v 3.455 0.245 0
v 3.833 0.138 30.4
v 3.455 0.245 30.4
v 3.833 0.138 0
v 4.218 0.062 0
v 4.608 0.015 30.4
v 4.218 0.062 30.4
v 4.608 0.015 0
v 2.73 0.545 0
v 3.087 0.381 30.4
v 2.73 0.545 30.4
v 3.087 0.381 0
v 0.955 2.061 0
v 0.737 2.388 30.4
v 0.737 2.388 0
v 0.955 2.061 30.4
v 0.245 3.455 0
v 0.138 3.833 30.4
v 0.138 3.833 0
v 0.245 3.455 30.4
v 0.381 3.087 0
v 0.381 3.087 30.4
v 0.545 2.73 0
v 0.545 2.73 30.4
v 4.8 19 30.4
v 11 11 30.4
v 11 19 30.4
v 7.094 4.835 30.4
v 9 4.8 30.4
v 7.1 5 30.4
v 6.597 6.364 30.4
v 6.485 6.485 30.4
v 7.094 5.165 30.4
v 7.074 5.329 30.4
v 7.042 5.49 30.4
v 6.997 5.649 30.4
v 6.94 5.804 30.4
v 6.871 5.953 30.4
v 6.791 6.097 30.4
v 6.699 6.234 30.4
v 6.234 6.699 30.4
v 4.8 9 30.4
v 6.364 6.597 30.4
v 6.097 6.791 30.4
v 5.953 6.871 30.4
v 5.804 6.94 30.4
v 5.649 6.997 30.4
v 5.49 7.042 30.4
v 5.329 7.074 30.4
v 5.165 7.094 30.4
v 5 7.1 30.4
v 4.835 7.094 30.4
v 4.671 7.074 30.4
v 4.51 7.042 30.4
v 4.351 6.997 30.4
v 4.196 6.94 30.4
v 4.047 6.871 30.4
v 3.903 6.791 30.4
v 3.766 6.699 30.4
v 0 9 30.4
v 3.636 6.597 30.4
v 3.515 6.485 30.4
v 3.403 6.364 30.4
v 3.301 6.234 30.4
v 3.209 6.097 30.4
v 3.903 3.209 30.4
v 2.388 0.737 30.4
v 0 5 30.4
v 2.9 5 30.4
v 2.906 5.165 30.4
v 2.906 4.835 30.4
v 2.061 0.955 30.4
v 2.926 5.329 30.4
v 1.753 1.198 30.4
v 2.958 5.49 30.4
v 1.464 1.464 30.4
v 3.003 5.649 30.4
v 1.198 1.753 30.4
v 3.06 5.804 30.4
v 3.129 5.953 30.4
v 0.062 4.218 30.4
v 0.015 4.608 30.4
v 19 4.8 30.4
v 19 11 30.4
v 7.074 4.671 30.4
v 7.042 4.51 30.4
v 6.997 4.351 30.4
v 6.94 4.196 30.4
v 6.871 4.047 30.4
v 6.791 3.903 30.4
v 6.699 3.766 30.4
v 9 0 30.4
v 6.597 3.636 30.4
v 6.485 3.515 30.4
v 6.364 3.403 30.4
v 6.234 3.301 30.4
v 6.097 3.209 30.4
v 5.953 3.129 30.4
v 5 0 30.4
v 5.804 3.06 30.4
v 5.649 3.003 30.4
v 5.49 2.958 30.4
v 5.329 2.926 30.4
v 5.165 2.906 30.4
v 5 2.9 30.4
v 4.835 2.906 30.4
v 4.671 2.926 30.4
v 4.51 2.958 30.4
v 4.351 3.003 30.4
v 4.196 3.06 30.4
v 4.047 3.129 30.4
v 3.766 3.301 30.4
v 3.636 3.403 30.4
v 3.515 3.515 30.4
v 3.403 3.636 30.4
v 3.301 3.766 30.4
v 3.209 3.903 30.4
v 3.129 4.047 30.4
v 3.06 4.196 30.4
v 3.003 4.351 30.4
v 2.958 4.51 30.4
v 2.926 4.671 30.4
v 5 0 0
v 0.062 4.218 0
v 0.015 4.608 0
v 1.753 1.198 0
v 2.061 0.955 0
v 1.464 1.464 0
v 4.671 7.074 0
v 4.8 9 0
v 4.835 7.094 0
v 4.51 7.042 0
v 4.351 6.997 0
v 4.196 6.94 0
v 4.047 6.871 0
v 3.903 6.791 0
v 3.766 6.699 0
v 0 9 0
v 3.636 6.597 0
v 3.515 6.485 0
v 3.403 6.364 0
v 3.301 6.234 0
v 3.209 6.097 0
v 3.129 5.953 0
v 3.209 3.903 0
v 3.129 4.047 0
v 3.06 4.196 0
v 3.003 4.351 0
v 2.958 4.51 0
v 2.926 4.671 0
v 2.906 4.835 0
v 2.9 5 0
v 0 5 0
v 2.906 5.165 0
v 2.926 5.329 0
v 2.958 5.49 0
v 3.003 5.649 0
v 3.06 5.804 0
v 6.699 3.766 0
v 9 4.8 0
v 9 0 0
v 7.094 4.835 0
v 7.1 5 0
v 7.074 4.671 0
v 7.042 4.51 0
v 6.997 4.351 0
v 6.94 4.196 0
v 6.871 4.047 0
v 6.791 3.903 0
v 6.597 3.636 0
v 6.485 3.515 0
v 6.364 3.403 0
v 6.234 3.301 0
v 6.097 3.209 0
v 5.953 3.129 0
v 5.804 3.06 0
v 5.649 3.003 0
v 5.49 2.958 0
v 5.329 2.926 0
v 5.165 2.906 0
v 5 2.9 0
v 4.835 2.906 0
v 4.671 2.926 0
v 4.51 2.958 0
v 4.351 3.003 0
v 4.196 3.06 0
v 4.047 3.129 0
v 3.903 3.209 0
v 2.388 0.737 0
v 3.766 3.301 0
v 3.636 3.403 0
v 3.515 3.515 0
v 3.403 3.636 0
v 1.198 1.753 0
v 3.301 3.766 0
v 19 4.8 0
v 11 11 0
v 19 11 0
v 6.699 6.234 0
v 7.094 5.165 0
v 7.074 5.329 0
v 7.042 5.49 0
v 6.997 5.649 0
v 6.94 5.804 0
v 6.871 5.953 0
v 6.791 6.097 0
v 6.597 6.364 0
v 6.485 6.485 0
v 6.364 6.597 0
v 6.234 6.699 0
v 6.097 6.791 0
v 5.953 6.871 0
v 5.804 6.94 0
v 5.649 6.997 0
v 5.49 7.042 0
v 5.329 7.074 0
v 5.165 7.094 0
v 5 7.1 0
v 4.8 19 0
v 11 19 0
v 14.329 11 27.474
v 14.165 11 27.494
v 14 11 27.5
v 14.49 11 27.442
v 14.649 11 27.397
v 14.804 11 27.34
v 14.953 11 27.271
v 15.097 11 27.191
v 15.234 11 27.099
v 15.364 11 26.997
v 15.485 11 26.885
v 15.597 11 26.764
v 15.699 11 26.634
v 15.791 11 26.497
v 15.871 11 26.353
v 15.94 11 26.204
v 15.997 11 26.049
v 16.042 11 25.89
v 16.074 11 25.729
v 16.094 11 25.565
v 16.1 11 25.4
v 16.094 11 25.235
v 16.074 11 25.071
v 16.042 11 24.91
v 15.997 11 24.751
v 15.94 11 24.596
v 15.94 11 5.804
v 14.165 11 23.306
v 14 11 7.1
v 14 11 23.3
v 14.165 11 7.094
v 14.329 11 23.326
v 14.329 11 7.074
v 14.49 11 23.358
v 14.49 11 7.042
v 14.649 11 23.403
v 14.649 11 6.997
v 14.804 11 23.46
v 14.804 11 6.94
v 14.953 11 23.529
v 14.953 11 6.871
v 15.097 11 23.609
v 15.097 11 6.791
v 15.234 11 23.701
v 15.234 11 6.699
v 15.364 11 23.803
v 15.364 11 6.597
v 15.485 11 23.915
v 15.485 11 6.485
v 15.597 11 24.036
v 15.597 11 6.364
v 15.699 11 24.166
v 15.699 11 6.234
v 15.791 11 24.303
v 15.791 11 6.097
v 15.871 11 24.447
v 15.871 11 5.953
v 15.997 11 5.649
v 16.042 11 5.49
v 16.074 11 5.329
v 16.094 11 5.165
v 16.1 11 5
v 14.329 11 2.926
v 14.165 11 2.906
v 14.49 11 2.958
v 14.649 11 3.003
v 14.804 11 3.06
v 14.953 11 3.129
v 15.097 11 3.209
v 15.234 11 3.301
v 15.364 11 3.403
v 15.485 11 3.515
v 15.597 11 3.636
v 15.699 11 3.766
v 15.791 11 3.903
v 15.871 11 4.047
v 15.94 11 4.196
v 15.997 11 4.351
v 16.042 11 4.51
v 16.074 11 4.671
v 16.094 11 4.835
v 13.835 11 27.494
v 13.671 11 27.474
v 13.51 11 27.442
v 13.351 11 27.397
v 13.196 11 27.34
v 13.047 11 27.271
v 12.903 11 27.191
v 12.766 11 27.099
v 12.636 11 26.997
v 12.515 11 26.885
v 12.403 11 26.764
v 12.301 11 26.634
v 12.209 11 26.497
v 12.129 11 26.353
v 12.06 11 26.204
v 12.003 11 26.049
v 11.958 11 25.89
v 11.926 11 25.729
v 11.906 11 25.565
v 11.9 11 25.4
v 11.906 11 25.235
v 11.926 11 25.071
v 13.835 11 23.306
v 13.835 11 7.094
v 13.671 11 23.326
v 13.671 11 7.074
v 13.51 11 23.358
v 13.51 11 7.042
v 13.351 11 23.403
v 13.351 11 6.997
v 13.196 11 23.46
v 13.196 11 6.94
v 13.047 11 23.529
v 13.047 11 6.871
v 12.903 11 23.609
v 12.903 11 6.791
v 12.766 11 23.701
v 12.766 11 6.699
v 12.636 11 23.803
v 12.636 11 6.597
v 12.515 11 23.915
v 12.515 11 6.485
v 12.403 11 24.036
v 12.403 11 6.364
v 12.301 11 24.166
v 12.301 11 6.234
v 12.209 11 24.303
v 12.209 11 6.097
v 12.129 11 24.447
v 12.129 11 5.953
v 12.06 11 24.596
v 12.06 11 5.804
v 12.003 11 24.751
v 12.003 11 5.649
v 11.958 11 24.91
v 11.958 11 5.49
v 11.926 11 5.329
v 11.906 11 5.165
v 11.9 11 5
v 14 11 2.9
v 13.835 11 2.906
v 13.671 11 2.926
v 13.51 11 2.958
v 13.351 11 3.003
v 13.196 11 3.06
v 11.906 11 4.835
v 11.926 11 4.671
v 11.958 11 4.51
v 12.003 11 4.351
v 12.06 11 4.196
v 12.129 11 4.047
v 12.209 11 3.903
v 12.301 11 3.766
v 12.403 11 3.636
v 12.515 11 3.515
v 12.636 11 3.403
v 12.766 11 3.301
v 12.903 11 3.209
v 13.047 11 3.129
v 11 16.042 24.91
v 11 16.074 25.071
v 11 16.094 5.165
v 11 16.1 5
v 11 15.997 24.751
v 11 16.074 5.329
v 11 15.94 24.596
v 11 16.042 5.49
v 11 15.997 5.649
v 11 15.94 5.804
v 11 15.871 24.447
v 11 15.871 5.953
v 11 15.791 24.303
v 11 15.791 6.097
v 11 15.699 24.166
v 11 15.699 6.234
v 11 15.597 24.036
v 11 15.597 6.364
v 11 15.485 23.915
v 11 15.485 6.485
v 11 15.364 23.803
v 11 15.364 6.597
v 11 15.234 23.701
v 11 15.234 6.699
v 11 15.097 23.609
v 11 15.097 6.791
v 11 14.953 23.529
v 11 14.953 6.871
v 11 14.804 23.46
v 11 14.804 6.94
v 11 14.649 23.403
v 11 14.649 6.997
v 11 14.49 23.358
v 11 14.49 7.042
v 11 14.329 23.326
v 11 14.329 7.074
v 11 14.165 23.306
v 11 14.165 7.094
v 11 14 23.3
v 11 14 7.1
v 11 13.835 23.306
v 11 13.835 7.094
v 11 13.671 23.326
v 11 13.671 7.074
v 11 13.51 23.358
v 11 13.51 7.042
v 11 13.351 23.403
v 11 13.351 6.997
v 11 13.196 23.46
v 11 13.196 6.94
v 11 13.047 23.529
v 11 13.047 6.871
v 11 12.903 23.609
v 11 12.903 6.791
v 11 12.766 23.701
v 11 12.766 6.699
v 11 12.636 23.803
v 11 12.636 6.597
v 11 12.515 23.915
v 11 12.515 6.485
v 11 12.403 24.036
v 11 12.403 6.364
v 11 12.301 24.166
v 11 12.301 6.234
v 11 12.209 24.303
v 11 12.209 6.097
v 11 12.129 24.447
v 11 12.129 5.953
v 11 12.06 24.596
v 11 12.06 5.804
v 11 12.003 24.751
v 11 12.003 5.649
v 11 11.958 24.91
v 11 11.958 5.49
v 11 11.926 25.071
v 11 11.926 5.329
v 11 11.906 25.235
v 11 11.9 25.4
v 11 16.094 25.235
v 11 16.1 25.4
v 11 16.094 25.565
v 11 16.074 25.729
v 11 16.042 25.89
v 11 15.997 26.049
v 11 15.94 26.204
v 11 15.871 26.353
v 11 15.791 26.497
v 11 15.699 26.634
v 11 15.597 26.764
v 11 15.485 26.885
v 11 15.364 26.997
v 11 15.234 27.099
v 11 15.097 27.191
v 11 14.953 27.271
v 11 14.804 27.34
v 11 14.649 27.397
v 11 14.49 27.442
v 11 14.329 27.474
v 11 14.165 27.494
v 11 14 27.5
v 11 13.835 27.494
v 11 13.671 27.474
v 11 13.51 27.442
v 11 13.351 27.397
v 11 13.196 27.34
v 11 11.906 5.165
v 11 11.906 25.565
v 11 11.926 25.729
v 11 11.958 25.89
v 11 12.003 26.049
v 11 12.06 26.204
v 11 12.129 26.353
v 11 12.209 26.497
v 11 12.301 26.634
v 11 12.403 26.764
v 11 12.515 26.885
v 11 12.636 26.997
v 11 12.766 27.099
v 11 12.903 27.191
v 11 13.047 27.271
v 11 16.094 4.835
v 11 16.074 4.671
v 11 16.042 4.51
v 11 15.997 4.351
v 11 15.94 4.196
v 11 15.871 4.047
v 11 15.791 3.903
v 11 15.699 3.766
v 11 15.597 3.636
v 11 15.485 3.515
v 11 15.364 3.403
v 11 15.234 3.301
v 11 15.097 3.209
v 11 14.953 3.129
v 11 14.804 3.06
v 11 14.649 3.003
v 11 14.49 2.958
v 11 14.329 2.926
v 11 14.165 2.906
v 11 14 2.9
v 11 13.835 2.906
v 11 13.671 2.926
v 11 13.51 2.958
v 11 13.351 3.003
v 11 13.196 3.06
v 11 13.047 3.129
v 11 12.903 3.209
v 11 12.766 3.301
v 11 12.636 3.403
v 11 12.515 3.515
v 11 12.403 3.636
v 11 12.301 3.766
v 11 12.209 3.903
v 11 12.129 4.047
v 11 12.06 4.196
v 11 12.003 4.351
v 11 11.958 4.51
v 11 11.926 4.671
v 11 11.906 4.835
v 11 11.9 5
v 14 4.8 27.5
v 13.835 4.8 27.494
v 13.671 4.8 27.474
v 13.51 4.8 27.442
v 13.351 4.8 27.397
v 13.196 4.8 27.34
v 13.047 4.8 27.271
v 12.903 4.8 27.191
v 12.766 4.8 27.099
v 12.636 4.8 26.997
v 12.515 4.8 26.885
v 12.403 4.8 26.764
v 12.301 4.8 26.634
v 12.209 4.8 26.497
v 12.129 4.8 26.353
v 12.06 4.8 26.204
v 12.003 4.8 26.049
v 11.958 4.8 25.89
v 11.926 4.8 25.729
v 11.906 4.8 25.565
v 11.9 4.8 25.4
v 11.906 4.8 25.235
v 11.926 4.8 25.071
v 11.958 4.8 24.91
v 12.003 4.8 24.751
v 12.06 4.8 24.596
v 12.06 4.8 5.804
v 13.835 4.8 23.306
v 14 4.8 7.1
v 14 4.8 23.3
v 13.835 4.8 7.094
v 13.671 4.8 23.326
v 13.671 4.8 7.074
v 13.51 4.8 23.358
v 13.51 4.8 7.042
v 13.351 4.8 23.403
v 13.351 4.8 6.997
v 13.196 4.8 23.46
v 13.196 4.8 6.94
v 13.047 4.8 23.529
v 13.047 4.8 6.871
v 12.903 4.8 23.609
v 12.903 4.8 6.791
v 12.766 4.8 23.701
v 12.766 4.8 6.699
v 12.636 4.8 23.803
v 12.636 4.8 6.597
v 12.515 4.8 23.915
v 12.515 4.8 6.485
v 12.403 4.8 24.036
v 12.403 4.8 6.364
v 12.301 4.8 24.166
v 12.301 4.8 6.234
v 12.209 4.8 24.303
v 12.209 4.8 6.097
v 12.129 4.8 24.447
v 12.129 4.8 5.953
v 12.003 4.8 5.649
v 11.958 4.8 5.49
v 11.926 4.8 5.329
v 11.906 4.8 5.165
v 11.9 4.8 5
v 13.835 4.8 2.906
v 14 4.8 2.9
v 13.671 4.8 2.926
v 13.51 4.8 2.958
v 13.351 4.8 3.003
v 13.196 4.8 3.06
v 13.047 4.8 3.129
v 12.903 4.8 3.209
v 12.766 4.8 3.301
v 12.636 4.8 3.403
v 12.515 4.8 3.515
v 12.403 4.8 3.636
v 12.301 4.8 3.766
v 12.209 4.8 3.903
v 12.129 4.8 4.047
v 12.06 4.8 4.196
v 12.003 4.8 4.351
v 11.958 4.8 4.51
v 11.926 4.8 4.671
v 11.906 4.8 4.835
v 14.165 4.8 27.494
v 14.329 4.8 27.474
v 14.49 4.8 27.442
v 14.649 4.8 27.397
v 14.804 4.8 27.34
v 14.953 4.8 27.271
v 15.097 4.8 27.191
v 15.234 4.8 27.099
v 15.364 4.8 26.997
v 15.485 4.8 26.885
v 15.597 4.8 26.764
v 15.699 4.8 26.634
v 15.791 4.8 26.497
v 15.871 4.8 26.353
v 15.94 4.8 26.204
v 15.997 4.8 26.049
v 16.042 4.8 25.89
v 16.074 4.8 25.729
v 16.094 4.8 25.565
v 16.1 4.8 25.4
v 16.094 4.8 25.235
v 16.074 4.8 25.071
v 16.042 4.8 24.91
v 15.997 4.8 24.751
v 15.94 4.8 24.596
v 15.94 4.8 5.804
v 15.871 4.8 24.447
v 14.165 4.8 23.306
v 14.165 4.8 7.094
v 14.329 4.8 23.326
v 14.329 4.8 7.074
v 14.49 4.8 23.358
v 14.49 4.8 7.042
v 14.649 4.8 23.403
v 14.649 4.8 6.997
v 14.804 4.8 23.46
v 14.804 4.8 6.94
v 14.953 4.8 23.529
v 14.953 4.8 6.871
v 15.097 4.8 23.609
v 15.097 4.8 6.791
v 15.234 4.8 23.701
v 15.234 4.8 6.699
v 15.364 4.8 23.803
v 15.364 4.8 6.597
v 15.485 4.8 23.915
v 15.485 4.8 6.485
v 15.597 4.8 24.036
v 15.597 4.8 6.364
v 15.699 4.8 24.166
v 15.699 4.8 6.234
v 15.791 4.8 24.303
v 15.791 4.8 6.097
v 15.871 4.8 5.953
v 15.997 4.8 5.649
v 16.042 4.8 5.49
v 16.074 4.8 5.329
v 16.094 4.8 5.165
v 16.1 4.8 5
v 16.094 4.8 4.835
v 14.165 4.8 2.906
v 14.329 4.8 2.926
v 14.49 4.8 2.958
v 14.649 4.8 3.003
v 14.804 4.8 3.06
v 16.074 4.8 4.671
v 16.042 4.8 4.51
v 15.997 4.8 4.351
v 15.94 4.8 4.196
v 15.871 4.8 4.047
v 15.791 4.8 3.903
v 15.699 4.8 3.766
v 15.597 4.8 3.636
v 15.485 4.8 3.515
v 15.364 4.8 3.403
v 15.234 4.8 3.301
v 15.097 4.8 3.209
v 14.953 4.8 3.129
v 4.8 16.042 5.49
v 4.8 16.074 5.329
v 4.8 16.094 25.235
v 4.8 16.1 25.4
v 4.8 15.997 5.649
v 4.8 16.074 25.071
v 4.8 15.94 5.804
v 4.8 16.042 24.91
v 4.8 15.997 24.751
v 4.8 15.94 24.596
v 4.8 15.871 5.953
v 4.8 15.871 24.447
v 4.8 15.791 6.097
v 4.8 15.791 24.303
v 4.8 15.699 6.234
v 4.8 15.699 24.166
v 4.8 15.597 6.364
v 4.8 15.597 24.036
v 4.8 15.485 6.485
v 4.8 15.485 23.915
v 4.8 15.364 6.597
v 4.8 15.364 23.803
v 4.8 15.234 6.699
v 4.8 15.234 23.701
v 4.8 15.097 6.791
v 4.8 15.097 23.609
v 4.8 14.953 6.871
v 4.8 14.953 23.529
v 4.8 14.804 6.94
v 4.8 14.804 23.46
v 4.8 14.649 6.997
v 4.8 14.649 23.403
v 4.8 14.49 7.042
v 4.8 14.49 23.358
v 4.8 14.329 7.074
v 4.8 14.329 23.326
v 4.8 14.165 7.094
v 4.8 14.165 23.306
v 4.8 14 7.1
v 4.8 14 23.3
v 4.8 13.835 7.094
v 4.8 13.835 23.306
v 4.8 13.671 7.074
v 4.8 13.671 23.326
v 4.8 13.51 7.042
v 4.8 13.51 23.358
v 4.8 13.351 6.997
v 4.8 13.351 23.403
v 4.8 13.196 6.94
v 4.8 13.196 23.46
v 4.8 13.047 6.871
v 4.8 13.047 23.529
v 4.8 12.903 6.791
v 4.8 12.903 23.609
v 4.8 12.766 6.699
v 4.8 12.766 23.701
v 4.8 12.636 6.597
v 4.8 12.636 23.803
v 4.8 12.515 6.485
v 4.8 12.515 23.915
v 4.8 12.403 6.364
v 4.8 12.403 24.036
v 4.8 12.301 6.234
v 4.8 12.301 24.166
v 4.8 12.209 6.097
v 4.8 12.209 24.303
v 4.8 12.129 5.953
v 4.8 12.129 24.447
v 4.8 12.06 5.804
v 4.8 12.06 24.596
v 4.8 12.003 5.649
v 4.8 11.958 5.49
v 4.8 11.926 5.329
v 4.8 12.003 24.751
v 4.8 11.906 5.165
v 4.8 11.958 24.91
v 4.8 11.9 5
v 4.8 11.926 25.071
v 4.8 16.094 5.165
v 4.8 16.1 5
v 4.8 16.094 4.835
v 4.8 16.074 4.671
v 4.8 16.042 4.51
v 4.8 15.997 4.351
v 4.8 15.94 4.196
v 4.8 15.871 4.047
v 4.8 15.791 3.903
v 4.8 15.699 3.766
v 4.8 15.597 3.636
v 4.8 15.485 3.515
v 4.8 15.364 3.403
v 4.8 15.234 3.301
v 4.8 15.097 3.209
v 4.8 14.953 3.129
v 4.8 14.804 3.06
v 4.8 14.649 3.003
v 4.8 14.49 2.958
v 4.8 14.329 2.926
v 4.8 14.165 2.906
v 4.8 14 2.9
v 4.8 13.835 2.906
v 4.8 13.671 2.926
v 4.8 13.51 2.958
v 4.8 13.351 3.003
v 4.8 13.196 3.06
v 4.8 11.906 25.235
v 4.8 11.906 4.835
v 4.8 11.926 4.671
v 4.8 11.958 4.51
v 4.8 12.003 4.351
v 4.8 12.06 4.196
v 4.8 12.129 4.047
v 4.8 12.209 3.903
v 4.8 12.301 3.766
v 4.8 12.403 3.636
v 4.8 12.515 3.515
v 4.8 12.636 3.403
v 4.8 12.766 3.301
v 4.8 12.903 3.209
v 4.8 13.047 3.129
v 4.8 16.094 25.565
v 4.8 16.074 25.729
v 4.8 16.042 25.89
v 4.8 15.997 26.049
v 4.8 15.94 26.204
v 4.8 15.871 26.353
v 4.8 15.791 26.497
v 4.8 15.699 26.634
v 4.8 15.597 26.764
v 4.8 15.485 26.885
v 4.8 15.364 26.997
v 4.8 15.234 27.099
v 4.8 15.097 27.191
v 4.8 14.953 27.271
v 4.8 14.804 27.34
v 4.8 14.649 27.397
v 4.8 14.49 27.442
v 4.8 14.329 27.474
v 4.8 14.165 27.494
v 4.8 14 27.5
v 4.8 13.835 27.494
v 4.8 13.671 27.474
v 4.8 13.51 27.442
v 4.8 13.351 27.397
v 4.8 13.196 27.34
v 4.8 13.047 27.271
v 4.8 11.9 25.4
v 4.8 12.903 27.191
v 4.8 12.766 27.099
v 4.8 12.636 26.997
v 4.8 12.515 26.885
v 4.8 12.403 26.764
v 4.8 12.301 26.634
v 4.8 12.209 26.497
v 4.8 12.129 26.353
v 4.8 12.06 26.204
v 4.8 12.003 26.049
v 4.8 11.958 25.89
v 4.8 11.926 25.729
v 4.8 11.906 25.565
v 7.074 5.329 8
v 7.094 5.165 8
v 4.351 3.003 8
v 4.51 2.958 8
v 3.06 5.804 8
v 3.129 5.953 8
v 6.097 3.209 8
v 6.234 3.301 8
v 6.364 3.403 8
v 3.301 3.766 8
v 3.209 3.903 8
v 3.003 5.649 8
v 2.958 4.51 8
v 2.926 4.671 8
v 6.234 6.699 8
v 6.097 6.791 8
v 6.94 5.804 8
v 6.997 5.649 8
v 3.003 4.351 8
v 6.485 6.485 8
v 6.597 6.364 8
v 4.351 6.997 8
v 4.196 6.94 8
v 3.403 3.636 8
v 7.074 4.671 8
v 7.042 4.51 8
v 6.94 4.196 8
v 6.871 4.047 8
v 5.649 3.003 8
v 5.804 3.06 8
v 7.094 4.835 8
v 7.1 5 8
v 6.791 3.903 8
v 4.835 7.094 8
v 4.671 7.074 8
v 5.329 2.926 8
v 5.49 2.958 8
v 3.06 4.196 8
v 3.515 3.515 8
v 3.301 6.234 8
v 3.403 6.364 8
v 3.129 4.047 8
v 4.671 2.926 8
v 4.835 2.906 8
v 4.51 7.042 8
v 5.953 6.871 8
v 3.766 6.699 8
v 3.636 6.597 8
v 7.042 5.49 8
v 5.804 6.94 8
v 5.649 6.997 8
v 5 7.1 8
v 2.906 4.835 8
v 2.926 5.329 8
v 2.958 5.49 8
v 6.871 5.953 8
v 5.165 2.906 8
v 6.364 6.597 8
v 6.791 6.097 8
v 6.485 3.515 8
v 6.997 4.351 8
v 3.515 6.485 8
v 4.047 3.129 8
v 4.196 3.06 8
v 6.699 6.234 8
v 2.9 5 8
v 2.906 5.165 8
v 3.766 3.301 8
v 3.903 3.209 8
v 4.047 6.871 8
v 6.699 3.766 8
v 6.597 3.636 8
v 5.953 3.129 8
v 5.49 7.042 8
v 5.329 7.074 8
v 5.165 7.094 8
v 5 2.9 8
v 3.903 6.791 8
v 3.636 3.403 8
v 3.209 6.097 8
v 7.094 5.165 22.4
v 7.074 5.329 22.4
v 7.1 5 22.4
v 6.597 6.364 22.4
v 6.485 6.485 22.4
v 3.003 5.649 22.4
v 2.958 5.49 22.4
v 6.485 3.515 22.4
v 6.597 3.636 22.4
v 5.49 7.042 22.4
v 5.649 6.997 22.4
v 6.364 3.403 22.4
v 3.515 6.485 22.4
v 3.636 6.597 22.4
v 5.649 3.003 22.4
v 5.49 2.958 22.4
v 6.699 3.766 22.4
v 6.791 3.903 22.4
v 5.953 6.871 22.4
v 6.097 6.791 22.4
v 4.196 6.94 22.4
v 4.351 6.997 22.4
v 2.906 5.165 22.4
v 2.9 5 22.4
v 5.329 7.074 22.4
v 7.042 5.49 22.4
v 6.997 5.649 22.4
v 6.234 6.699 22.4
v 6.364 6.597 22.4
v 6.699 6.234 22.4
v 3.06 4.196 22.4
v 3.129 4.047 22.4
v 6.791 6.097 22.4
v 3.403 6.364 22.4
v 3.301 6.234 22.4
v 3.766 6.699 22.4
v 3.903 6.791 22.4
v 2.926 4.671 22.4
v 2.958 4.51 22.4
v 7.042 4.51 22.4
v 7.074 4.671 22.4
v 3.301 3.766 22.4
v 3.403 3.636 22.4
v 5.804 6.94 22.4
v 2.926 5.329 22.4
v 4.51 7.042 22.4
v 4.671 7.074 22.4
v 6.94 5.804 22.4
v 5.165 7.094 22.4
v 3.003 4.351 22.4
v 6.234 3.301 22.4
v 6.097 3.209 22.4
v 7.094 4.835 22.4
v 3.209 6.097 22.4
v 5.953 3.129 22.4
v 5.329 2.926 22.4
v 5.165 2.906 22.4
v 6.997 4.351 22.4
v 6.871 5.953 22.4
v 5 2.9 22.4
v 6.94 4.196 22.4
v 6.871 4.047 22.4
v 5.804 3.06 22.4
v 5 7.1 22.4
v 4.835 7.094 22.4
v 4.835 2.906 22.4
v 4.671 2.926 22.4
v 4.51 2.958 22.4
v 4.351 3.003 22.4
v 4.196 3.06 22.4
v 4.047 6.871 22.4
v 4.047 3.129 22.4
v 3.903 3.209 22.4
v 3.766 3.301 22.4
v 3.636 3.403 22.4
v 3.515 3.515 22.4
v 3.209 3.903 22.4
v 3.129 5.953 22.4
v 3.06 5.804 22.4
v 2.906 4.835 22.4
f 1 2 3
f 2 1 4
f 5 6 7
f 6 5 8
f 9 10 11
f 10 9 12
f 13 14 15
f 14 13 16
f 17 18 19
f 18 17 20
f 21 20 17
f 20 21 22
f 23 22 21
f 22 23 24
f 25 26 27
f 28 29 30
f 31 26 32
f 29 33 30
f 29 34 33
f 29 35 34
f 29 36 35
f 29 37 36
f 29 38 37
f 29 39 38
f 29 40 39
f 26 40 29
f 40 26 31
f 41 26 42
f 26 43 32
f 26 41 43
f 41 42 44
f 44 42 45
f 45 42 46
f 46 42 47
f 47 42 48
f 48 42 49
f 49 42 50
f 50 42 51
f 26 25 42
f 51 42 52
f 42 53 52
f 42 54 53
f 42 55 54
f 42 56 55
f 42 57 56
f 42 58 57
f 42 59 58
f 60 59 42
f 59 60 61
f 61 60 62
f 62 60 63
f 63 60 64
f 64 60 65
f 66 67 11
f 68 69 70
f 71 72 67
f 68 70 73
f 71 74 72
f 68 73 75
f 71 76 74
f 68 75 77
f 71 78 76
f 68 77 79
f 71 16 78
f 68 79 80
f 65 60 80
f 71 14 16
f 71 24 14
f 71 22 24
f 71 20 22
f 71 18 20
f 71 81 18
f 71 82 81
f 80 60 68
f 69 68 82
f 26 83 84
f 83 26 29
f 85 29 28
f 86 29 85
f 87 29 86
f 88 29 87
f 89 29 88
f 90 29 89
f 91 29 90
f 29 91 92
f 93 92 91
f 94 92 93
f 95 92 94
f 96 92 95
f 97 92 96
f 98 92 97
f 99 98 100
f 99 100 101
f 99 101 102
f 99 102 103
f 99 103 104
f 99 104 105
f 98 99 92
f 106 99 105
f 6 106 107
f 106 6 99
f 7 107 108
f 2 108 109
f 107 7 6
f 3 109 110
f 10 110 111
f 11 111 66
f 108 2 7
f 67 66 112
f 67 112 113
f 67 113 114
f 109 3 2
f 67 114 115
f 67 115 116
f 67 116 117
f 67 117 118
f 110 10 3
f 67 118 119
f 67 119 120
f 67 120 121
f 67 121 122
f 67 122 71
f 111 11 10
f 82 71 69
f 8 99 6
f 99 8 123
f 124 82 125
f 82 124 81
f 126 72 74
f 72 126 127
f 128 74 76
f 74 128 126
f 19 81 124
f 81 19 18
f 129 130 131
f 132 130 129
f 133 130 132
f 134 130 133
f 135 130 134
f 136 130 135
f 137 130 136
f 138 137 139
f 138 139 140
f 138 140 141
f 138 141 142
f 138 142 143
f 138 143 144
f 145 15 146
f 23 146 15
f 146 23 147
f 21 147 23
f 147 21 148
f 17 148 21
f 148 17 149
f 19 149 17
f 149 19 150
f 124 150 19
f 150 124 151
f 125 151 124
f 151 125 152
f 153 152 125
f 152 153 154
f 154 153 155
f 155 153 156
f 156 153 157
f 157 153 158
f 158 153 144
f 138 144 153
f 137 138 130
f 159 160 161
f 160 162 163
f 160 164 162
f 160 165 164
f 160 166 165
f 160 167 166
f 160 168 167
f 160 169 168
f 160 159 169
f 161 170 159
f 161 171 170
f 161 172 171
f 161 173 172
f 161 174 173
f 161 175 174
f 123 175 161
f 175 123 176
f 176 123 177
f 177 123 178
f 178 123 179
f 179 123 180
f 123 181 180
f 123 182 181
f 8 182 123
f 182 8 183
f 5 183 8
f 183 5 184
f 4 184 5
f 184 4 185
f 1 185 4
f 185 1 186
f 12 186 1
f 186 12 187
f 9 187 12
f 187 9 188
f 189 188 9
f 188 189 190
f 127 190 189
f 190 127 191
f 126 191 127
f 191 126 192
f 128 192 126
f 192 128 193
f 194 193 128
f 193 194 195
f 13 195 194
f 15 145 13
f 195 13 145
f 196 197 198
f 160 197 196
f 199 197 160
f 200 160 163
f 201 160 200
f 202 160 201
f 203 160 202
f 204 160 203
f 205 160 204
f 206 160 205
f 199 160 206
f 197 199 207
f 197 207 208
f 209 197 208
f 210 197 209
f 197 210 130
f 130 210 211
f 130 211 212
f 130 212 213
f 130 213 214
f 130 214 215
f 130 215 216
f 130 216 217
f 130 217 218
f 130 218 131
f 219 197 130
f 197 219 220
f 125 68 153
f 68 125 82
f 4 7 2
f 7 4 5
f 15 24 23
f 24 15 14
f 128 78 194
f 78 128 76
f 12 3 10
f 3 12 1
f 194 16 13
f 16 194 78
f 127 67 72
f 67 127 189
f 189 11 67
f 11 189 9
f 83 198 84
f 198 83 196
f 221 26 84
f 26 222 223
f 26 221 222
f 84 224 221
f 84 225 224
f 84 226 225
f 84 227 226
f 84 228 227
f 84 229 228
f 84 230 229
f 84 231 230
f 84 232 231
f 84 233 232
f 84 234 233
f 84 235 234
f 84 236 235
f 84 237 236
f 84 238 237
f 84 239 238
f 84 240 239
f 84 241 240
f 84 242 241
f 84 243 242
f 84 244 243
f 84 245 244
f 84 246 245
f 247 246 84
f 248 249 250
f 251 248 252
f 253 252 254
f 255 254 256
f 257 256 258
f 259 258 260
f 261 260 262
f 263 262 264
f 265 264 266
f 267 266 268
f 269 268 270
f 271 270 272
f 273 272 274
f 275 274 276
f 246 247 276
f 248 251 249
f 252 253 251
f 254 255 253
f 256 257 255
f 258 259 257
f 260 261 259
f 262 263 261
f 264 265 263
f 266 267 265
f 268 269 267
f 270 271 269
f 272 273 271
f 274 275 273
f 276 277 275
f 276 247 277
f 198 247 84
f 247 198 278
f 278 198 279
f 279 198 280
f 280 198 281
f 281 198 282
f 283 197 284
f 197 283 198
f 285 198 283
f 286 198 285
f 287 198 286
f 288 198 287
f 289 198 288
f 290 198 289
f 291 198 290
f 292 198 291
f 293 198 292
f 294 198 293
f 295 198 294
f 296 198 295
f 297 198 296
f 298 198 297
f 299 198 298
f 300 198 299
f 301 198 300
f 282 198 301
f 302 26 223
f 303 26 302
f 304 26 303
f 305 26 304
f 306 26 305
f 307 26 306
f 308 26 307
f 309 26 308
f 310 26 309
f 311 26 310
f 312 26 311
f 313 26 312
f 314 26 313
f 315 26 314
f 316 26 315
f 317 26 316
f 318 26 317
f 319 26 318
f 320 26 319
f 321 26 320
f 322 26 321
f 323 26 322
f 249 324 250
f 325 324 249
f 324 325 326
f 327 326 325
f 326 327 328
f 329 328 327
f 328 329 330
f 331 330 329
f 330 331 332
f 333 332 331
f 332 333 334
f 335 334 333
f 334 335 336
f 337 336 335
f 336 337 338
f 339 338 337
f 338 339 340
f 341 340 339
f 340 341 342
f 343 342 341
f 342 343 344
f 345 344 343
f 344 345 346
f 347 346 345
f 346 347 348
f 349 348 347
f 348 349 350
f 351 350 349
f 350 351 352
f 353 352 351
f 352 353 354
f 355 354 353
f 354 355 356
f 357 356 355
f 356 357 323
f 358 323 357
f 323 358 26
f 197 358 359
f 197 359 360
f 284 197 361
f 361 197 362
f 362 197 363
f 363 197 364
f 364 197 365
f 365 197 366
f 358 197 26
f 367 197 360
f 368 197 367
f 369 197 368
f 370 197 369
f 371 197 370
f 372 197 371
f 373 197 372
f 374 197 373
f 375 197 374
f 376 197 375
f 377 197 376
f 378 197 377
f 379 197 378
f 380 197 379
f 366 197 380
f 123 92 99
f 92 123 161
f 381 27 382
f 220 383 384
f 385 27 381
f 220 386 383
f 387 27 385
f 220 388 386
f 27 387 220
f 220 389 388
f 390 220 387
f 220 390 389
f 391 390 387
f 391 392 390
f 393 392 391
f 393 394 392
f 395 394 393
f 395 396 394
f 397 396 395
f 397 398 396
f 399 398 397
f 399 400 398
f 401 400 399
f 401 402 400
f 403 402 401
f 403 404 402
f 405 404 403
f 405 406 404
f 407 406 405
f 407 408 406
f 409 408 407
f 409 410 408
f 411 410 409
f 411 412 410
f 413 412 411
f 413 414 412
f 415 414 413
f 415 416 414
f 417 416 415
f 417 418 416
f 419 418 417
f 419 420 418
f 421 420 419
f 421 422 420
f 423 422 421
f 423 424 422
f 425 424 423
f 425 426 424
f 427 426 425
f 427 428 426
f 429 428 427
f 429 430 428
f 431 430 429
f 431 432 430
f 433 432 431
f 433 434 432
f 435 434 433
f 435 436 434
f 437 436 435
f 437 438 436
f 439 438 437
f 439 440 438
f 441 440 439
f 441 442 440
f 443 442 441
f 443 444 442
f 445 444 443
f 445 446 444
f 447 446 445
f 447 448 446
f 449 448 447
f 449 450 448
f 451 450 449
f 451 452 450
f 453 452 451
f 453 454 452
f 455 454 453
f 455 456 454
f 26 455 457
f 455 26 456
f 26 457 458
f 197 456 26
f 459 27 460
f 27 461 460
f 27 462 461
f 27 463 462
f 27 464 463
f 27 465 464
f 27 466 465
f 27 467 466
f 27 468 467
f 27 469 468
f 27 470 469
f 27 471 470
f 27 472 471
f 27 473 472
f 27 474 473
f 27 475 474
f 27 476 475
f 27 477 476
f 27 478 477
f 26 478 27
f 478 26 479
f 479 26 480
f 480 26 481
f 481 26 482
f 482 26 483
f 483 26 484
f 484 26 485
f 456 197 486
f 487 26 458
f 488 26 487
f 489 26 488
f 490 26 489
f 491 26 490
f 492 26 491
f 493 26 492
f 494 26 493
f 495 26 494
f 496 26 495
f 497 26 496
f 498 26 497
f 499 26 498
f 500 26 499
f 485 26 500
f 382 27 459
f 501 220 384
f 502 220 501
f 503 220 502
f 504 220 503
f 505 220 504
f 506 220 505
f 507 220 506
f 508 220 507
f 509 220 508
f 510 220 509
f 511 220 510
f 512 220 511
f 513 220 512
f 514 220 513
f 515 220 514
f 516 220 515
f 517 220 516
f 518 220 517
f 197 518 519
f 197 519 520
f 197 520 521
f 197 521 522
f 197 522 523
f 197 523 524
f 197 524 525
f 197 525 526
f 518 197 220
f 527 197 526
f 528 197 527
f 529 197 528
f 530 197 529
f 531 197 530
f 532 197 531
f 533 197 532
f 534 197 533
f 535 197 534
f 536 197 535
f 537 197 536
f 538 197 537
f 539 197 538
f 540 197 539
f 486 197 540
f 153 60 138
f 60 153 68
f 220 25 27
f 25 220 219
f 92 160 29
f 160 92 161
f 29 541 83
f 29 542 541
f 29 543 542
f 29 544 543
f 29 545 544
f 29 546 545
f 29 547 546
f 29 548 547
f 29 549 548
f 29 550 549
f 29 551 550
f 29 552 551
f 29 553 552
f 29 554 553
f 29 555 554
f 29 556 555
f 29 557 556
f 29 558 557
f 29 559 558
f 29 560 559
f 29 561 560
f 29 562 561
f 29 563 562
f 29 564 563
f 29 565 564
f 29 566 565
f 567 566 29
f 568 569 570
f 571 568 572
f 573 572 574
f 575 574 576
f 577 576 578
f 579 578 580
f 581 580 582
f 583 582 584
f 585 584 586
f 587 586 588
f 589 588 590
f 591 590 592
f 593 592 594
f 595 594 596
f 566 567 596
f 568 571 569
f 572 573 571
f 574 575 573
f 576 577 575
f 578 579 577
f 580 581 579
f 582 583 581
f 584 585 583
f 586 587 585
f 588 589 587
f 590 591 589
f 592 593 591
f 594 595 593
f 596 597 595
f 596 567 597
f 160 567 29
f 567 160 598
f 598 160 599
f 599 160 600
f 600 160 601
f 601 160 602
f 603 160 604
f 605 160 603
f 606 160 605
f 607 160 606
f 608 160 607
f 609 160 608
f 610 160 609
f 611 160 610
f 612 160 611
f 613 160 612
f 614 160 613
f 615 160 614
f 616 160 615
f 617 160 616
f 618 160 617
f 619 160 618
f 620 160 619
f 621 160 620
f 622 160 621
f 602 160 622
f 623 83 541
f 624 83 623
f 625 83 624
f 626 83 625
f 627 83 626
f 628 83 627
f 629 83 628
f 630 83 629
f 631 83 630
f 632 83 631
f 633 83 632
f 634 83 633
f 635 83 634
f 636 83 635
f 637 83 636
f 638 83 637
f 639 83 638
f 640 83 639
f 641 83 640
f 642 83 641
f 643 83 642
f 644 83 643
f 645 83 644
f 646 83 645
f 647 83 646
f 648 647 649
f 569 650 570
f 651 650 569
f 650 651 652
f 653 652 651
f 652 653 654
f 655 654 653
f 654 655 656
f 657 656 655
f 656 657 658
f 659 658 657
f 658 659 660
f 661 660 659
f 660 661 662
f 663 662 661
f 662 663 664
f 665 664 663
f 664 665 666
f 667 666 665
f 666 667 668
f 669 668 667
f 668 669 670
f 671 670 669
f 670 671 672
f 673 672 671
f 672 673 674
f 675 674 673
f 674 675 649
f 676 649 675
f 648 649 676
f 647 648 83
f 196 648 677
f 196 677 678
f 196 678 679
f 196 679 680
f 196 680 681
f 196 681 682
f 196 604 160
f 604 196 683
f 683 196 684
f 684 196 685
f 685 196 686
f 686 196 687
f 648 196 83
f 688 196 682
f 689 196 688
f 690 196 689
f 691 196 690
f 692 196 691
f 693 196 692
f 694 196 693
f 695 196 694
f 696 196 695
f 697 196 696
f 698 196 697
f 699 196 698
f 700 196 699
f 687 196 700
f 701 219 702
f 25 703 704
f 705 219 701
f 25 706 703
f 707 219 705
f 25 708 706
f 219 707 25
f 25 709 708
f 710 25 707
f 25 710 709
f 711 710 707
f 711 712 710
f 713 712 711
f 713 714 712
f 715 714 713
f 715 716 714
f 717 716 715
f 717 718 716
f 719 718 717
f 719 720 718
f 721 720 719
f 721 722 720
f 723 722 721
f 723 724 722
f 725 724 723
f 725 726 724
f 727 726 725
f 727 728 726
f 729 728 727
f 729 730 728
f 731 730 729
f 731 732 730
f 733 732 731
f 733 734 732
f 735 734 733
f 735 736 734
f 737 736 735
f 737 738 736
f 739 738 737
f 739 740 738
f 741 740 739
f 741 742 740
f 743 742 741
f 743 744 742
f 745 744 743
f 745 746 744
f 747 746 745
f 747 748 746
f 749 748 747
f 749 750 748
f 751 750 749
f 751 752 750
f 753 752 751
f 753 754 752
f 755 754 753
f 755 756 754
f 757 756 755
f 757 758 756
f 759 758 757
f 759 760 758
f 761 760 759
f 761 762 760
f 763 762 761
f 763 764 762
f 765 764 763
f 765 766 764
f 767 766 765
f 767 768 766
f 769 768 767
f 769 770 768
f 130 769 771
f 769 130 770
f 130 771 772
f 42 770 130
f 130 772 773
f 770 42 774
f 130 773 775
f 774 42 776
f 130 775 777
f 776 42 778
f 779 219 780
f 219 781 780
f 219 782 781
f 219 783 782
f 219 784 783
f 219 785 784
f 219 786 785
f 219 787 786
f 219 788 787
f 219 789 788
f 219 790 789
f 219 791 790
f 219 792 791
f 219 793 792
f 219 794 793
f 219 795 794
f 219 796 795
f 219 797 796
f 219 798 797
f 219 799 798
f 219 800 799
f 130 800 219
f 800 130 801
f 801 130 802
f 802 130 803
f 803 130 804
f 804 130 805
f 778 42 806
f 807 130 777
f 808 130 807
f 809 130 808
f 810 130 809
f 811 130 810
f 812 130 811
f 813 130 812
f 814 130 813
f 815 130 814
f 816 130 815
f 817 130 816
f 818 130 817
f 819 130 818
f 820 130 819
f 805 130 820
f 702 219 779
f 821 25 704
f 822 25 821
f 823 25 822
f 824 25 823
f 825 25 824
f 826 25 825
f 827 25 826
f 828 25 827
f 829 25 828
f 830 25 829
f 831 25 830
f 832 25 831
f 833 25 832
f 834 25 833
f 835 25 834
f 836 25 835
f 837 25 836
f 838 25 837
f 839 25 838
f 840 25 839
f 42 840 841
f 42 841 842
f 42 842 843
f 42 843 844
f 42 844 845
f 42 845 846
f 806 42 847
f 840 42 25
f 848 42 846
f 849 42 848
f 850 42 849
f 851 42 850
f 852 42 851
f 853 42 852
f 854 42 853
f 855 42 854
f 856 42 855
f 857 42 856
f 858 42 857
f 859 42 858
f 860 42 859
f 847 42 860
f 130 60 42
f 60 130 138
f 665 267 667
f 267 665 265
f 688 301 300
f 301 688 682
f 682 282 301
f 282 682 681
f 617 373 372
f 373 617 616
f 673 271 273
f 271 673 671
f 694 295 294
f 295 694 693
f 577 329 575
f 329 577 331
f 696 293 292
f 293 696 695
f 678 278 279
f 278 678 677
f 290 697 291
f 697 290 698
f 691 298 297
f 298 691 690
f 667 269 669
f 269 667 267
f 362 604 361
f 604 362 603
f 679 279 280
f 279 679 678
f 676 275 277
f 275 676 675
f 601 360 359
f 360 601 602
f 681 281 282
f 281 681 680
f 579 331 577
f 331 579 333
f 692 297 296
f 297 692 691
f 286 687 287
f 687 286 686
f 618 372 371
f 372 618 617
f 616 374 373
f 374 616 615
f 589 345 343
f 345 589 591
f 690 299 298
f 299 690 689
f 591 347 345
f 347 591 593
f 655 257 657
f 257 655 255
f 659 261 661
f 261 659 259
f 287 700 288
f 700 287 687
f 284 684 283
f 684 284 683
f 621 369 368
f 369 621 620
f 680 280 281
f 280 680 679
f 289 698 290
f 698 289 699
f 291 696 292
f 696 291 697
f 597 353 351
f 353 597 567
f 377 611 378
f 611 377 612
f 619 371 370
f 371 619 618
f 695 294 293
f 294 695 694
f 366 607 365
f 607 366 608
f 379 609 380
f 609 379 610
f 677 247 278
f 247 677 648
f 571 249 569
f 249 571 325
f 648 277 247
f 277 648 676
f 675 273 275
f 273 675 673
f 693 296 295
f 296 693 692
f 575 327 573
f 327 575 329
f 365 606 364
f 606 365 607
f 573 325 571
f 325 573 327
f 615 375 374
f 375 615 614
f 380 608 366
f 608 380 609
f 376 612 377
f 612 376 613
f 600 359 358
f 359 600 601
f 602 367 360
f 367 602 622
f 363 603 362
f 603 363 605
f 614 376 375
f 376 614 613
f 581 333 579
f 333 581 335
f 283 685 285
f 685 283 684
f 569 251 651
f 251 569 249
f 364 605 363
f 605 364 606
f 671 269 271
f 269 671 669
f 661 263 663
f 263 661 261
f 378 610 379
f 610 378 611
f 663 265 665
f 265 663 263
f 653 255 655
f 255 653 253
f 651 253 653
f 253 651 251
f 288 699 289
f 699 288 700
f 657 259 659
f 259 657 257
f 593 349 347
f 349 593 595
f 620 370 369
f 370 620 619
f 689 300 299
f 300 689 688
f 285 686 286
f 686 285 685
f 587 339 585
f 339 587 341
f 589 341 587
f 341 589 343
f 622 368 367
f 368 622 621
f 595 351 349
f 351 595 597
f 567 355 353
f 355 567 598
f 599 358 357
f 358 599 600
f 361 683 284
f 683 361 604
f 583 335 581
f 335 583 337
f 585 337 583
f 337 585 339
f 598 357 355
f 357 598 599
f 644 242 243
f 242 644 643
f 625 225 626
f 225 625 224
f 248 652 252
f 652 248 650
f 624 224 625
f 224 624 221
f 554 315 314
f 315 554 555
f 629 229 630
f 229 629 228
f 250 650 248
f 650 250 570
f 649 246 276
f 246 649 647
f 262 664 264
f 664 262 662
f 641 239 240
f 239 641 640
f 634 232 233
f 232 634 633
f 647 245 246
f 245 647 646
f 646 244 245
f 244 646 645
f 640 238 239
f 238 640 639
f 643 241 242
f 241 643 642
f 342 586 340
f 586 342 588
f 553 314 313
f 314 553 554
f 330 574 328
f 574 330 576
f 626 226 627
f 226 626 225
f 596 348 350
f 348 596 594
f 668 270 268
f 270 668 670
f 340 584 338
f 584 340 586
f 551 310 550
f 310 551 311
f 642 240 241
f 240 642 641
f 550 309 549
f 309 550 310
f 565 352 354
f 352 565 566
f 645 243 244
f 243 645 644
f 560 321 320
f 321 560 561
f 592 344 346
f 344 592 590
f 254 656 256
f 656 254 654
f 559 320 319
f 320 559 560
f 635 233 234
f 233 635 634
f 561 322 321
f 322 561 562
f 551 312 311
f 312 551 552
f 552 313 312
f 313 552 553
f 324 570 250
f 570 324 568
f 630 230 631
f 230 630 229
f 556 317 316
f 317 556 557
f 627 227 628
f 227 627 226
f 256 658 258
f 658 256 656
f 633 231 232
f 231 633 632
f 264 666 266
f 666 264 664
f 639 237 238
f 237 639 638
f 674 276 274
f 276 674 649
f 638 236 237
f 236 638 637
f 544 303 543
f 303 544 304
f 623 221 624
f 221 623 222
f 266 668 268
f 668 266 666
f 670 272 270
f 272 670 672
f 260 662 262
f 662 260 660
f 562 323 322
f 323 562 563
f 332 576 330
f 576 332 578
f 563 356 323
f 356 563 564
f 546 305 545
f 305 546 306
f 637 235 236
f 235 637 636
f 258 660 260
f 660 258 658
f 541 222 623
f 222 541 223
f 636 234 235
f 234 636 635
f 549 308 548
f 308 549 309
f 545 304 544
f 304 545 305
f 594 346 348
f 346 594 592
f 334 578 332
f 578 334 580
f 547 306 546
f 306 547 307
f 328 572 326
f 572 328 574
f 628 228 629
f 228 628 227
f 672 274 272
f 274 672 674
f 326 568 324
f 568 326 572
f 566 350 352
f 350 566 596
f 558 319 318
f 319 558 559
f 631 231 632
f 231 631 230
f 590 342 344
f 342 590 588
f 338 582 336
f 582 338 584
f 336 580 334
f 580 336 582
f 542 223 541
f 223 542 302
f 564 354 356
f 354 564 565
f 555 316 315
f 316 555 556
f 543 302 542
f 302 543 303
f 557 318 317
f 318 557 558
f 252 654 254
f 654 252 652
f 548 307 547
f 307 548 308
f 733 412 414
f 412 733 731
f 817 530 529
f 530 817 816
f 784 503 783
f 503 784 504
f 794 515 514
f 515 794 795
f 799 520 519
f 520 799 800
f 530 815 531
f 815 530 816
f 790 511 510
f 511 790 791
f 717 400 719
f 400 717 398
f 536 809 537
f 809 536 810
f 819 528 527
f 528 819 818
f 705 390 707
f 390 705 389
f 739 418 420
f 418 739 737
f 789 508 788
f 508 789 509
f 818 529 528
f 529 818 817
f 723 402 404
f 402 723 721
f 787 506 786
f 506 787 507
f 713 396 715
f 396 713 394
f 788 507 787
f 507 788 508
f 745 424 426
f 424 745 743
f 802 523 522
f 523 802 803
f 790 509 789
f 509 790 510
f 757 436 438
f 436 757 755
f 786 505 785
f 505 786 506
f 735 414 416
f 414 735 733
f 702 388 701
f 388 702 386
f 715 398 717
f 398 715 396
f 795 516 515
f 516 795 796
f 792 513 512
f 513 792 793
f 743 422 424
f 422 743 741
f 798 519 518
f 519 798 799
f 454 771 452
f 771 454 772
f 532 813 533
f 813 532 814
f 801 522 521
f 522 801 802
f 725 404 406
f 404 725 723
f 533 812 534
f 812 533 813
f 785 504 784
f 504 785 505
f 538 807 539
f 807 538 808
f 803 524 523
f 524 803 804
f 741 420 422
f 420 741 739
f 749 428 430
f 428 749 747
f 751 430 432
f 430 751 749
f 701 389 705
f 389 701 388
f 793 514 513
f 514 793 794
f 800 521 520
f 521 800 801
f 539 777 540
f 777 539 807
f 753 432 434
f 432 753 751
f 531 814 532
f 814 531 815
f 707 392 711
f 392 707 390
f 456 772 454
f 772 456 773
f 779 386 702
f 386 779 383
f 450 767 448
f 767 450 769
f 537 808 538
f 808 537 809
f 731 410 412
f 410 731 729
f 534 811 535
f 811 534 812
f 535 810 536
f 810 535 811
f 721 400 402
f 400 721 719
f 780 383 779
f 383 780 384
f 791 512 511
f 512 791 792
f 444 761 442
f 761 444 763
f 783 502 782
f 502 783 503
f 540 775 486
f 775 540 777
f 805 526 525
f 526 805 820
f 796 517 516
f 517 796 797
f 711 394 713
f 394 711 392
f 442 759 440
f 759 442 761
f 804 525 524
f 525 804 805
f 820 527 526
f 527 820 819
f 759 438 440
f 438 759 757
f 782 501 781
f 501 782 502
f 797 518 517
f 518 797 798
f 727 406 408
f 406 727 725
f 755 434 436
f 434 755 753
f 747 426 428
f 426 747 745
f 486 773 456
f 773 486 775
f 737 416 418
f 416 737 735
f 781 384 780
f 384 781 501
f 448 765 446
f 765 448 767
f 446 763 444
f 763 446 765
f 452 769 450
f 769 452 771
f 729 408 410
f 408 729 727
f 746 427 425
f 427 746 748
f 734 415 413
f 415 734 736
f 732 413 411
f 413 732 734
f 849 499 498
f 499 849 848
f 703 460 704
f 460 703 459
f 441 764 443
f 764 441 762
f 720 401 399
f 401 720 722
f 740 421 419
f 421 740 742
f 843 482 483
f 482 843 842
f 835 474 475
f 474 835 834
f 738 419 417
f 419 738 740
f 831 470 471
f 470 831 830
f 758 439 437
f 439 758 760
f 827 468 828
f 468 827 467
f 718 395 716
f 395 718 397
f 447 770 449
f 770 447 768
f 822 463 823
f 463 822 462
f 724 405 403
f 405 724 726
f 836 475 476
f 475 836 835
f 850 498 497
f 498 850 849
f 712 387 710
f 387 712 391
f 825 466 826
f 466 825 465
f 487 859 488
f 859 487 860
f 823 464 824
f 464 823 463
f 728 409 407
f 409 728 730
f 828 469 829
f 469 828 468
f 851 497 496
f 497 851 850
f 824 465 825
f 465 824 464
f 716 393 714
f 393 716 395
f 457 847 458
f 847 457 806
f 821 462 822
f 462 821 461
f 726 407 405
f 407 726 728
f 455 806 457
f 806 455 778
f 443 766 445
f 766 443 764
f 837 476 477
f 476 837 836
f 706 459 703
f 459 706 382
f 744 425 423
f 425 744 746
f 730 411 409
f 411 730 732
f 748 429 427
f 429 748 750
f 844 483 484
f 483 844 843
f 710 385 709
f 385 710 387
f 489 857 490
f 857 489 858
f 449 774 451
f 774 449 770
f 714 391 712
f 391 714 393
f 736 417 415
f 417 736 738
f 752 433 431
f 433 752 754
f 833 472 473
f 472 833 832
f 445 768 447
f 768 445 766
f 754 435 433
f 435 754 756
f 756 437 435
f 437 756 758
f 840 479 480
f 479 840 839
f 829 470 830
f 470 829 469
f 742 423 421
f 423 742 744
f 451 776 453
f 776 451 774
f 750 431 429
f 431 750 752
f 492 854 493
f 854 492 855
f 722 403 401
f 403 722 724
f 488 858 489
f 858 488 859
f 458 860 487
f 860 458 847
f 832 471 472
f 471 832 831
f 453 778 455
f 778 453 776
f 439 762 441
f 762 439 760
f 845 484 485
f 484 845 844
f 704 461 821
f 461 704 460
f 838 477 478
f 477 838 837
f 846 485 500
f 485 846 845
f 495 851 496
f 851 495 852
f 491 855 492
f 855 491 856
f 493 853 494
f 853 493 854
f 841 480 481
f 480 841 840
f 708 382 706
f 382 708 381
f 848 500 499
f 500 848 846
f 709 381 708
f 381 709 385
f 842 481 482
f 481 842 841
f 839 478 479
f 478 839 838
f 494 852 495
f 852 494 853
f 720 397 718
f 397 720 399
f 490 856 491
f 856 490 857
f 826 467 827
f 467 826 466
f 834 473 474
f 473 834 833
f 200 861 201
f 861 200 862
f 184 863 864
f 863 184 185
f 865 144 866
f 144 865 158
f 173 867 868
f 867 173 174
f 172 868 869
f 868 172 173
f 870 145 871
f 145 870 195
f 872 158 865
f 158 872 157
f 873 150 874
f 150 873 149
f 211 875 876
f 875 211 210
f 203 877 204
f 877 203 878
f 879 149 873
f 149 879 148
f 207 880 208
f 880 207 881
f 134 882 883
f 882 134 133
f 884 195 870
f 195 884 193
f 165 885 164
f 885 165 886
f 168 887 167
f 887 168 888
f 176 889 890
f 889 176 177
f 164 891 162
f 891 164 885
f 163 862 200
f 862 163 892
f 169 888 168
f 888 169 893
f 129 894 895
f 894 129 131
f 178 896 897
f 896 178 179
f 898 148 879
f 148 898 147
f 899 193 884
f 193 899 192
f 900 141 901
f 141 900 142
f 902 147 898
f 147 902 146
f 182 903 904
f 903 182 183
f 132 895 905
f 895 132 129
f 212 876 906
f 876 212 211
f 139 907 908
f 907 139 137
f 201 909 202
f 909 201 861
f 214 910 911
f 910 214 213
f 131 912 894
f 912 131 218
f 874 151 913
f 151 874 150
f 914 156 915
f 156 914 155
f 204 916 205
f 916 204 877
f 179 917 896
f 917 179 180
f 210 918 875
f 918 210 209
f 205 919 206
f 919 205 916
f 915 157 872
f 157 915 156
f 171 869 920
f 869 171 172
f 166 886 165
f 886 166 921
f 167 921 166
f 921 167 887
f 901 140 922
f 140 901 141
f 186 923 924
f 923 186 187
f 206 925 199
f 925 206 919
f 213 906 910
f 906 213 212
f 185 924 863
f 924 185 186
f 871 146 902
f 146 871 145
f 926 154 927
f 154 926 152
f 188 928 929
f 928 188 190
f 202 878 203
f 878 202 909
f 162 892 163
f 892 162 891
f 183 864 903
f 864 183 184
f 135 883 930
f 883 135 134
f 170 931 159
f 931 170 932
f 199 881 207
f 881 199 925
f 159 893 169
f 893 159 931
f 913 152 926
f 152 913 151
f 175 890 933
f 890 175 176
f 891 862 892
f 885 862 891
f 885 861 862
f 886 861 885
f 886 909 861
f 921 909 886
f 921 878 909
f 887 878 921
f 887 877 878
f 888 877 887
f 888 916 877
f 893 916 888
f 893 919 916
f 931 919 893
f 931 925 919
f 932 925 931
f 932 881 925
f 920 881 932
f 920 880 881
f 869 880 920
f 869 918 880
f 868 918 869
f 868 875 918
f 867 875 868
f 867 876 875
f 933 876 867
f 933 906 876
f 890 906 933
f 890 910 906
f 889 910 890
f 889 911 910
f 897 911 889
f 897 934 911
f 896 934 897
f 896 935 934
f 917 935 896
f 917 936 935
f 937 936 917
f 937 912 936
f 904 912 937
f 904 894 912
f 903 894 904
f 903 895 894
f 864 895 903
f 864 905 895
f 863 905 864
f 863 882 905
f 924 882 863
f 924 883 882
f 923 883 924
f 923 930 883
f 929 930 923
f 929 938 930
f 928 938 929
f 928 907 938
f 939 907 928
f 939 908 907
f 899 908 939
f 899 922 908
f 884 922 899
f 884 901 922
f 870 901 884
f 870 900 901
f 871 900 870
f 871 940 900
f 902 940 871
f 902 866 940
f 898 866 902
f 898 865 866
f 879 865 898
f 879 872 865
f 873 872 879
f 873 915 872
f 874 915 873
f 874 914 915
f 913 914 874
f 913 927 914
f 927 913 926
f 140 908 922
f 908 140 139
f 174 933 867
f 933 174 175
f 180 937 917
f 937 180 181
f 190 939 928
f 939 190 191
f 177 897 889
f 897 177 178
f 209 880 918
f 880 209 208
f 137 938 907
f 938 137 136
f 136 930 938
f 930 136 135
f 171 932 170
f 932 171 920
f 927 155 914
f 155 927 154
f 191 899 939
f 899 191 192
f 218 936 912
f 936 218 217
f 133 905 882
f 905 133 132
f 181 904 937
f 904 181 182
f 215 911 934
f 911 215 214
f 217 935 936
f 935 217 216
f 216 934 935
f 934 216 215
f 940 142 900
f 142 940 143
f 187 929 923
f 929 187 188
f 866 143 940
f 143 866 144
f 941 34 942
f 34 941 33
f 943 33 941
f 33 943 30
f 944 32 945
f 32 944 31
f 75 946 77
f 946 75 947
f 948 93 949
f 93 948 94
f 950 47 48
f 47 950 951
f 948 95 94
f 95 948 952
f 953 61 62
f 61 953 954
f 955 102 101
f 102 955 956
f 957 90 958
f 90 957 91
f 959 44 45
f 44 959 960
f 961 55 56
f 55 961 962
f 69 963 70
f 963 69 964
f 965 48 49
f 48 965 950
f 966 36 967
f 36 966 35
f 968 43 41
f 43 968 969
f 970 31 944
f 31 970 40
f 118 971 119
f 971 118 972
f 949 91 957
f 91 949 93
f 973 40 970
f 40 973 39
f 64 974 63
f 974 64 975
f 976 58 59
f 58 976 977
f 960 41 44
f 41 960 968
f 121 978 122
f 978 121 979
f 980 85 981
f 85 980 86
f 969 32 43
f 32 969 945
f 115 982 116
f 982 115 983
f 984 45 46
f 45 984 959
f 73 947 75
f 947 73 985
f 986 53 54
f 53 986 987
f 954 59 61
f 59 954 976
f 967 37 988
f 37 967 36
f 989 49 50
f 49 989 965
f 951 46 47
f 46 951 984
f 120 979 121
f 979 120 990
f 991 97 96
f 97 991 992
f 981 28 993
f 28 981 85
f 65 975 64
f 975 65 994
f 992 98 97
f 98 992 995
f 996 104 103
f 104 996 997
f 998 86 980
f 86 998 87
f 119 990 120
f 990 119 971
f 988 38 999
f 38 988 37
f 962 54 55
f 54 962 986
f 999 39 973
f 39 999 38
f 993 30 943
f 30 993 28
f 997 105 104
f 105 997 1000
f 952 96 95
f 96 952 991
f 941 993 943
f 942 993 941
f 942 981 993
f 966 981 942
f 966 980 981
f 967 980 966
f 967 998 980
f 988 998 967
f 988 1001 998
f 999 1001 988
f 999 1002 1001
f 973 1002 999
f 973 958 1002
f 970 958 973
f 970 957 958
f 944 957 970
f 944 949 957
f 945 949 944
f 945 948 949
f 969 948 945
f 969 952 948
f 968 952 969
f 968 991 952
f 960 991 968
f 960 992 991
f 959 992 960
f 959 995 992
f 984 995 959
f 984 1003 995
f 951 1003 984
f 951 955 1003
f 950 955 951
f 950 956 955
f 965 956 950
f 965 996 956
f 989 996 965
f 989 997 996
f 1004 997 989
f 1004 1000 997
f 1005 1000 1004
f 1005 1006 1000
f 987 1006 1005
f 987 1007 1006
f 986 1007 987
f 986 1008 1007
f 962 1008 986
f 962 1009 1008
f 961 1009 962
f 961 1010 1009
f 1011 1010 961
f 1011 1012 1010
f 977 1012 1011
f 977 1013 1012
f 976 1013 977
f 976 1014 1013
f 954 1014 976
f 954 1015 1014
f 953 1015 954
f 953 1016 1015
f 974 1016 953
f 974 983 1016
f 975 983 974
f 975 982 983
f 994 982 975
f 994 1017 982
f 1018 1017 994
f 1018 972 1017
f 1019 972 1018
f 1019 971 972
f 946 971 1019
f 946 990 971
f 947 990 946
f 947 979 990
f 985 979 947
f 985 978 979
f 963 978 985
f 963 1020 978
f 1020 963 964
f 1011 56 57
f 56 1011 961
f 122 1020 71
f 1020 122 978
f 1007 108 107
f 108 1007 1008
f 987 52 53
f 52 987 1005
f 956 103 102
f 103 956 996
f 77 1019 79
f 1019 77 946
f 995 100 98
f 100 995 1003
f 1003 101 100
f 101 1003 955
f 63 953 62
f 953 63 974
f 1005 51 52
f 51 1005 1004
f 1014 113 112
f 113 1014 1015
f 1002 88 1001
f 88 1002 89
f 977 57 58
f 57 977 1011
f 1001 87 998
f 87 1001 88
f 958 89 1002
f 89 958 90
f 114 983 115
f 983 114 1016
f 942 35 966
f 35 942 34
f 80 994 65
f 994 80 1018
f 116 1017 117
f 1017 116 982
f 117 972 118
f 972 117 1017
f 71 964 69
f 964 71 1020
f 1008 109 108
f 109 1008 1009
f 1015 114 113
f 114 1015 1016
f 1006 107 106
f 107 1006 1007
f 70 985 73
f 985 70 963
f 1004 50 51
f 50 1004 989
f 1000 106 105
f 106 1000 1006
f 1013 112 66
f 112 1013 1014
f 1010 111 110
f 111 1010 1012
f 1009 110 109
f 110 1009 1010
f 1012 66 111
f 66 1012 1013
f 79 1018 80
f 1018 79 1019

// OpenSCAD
// file: ../configurations/global.scad
// external size
case_external_x_size = 90;
case_external_y_size = 140;
case_external_z_size = 40;
case_external_panes_thickness = 4.8;

facade_front_round_edges_radius = 5;
facade_throws_margin = 5;

// facade corners
facade_corners_offset_lenght = 9;
facade_corners_main_x_size = 19;
facade_corners_main_y_size = 19;
facade_corners_main_thickness = 11;

facade_fn = 100;


facade_controller_coords = [
    case_external_x_size / 2,
    case_external_y_size / 2 - 30,
];

// Generics
insert_throw_diameter = 4.2;
insert_throw_length = 6 + 2;



// Controller facade
controller_breadboard_x_size_point = 28;
controller_breadboard_y_size_point = 9;

controller_facade_z_size = 2;
controller_facade_button_throw_margin = 1;

controller_facade_border_rounded_border_1 = 5;
controller_facade_border_rounded_border_2 = 4;

controller_facade_with_border_x_size = 78;
controller_facade_with_border_y_size = 45;

controller_facade_border_throws_margin = 5;
controller_facade_border_fn = 80;

// Cross Button
controller_cross_button_x_y_size = 20;
controller_cross_button_z_size = 4;
controller_cross_button_thickness = 6;
controller_cross_button_round_edges_radius = 1;
controller_cross_button_support_x_y_size = 22;
controller_cross_button_support_z_size = 1;
controller_cross_button_fn = 150;

// A and B Buttons
controller_a_b_button_diameter = 7;
controller_a_b_button_z_size = 4;
controller_a_b_button_support_diameter = 9;
controller_a_b_button_support_z_size = 1;
controller_a_b_button_fn = 80;

// small Buttons
controller_small_button_diameter = 5;
controller_small_button_z_size = 3;
controller_small_button_support_diameter = 7;
controller_small_button_support_z_size = 1;
controller_small_button_fn = 80;

controller_directional_cross_points_coords = [6, 5];
controller_start_button_points_coords = [14, 3];
controller_select_button_points_coords = [18, 3];
controller_menu_button_points_coords = [14, 7];
controller_option_button_points_coords = [18, 7];
controller_a_button_points_coords = [23, 4];
controller_b_button_points_coords = [27, 6];
controller_bolt_throws_list = [
    [2, 2],
    [2, 8],
    [10, 2],
    [10, 8],
    [27, 2],
    [23, 8],
];


// Positionning
// main file
include <./../configurations/global.scad>


module facadeCorner(
    round_radius = facade_front_round_edges_radius,
    z_size = case_external_z_size - (case_external_panes_thickness * 2),
    main_x_size = facade_corners_main_x_size,
    main_y_size = facade_corners_main_y_size,
    main_thickness = facade_corners_main_thickness,

    offset_thickness = case_external_panes_thickness,
    offset_lenght = facade_corners_offset_lenght,

    correction_offset_thickness = 0.0, //
    correction_offset_length = 0.0, //

    throw_diameter = insert_throw_diameter,
    throw_depth = insert_throw_length,
    throw_x_margin = facade_throws_margin,
    throw_y_margin = facade_throws_margin,
    throw_z_margin = facade_throws_margin,
    $fn = facade_fn
) {

    difference() {
        union() {
            translate([round_radius, round_radius, 0])
                cylinder(h = z_size, r = round_radius, $fn = $fn);

            translate([round_radius, 0,0])
                cube([
                    main_x_size - round_radius,
                    main_thickness,
                    z_size
                ]);

            translate([0, round_radius, 0])
                cube([
                    main_thickness,
                    main_y_size - round_radius,
                    z_size
                ]);
        }

        translate([-correction_offset_length, correction_offset_thickness, 0])
            translate([offset_lenght, -main_thickness + offset_thickness, - z_size / 2])
                cube([
                    main_x_size - round_radius,
                    main_thickness,
                    z_size * 2
                ]);

        translate([correction_offset_thickness, -correction_offset_length, 0])
            translate([-main_thickness + offset_thickness, offset_lenght, - z_size / 2])
                cube([
                    main_thickness,
                    main_y_size - round_radius,
                    z_size * 2
                ]);

        // x throws
        translate([offset_lenght + throw_x_margin,  offset_thickness - 0.1, throw_y_margin])
            rotate([-90,0,0])
                cylinder(h = throw_depth + 0.1, d = throw_diameter, $fn = $fn);

        translate([offset_lenght + throw_x_margin, offset_thickness - 0.1, z_size - throw_y_margin])
            rotate([-90,0,0])
                cylinder(h = throw_depth + 0.1, d = throw_diameter, $fn = $fn);


        // y throws
        translate([offset_thickness - 0.1, offset_lenght + throw_y_margin, throw_y_margin])
            rotate([0, 90, 0])
                cylinder(h = throw_depth + 0.1, d = throw_diameter, $fn = $fn);

        translate([offset_thickness - 0.1, offset_lenght + throw_y_margin, z_size - throw_y_margin])
            rotate([0, 90, 0])
                cylinder(h = throw_depth + 0.1, d = throw_diameter, $fn = $fn);


        // z throws
        translate([throw_z_margin, throw_z_margin, -0.1])
            cylinder(h = throw_depth + 0.1, d = throw_diameter, $fn = $fn);

        translate([throw_z_margin, throw_z_margin, z_size - throw_depth])
            cylinder(h = throw_depth + 0.1, d = throw_diameter, $fn = $fn);

    }
}


facadeCorner(
    $fn = 80
);
